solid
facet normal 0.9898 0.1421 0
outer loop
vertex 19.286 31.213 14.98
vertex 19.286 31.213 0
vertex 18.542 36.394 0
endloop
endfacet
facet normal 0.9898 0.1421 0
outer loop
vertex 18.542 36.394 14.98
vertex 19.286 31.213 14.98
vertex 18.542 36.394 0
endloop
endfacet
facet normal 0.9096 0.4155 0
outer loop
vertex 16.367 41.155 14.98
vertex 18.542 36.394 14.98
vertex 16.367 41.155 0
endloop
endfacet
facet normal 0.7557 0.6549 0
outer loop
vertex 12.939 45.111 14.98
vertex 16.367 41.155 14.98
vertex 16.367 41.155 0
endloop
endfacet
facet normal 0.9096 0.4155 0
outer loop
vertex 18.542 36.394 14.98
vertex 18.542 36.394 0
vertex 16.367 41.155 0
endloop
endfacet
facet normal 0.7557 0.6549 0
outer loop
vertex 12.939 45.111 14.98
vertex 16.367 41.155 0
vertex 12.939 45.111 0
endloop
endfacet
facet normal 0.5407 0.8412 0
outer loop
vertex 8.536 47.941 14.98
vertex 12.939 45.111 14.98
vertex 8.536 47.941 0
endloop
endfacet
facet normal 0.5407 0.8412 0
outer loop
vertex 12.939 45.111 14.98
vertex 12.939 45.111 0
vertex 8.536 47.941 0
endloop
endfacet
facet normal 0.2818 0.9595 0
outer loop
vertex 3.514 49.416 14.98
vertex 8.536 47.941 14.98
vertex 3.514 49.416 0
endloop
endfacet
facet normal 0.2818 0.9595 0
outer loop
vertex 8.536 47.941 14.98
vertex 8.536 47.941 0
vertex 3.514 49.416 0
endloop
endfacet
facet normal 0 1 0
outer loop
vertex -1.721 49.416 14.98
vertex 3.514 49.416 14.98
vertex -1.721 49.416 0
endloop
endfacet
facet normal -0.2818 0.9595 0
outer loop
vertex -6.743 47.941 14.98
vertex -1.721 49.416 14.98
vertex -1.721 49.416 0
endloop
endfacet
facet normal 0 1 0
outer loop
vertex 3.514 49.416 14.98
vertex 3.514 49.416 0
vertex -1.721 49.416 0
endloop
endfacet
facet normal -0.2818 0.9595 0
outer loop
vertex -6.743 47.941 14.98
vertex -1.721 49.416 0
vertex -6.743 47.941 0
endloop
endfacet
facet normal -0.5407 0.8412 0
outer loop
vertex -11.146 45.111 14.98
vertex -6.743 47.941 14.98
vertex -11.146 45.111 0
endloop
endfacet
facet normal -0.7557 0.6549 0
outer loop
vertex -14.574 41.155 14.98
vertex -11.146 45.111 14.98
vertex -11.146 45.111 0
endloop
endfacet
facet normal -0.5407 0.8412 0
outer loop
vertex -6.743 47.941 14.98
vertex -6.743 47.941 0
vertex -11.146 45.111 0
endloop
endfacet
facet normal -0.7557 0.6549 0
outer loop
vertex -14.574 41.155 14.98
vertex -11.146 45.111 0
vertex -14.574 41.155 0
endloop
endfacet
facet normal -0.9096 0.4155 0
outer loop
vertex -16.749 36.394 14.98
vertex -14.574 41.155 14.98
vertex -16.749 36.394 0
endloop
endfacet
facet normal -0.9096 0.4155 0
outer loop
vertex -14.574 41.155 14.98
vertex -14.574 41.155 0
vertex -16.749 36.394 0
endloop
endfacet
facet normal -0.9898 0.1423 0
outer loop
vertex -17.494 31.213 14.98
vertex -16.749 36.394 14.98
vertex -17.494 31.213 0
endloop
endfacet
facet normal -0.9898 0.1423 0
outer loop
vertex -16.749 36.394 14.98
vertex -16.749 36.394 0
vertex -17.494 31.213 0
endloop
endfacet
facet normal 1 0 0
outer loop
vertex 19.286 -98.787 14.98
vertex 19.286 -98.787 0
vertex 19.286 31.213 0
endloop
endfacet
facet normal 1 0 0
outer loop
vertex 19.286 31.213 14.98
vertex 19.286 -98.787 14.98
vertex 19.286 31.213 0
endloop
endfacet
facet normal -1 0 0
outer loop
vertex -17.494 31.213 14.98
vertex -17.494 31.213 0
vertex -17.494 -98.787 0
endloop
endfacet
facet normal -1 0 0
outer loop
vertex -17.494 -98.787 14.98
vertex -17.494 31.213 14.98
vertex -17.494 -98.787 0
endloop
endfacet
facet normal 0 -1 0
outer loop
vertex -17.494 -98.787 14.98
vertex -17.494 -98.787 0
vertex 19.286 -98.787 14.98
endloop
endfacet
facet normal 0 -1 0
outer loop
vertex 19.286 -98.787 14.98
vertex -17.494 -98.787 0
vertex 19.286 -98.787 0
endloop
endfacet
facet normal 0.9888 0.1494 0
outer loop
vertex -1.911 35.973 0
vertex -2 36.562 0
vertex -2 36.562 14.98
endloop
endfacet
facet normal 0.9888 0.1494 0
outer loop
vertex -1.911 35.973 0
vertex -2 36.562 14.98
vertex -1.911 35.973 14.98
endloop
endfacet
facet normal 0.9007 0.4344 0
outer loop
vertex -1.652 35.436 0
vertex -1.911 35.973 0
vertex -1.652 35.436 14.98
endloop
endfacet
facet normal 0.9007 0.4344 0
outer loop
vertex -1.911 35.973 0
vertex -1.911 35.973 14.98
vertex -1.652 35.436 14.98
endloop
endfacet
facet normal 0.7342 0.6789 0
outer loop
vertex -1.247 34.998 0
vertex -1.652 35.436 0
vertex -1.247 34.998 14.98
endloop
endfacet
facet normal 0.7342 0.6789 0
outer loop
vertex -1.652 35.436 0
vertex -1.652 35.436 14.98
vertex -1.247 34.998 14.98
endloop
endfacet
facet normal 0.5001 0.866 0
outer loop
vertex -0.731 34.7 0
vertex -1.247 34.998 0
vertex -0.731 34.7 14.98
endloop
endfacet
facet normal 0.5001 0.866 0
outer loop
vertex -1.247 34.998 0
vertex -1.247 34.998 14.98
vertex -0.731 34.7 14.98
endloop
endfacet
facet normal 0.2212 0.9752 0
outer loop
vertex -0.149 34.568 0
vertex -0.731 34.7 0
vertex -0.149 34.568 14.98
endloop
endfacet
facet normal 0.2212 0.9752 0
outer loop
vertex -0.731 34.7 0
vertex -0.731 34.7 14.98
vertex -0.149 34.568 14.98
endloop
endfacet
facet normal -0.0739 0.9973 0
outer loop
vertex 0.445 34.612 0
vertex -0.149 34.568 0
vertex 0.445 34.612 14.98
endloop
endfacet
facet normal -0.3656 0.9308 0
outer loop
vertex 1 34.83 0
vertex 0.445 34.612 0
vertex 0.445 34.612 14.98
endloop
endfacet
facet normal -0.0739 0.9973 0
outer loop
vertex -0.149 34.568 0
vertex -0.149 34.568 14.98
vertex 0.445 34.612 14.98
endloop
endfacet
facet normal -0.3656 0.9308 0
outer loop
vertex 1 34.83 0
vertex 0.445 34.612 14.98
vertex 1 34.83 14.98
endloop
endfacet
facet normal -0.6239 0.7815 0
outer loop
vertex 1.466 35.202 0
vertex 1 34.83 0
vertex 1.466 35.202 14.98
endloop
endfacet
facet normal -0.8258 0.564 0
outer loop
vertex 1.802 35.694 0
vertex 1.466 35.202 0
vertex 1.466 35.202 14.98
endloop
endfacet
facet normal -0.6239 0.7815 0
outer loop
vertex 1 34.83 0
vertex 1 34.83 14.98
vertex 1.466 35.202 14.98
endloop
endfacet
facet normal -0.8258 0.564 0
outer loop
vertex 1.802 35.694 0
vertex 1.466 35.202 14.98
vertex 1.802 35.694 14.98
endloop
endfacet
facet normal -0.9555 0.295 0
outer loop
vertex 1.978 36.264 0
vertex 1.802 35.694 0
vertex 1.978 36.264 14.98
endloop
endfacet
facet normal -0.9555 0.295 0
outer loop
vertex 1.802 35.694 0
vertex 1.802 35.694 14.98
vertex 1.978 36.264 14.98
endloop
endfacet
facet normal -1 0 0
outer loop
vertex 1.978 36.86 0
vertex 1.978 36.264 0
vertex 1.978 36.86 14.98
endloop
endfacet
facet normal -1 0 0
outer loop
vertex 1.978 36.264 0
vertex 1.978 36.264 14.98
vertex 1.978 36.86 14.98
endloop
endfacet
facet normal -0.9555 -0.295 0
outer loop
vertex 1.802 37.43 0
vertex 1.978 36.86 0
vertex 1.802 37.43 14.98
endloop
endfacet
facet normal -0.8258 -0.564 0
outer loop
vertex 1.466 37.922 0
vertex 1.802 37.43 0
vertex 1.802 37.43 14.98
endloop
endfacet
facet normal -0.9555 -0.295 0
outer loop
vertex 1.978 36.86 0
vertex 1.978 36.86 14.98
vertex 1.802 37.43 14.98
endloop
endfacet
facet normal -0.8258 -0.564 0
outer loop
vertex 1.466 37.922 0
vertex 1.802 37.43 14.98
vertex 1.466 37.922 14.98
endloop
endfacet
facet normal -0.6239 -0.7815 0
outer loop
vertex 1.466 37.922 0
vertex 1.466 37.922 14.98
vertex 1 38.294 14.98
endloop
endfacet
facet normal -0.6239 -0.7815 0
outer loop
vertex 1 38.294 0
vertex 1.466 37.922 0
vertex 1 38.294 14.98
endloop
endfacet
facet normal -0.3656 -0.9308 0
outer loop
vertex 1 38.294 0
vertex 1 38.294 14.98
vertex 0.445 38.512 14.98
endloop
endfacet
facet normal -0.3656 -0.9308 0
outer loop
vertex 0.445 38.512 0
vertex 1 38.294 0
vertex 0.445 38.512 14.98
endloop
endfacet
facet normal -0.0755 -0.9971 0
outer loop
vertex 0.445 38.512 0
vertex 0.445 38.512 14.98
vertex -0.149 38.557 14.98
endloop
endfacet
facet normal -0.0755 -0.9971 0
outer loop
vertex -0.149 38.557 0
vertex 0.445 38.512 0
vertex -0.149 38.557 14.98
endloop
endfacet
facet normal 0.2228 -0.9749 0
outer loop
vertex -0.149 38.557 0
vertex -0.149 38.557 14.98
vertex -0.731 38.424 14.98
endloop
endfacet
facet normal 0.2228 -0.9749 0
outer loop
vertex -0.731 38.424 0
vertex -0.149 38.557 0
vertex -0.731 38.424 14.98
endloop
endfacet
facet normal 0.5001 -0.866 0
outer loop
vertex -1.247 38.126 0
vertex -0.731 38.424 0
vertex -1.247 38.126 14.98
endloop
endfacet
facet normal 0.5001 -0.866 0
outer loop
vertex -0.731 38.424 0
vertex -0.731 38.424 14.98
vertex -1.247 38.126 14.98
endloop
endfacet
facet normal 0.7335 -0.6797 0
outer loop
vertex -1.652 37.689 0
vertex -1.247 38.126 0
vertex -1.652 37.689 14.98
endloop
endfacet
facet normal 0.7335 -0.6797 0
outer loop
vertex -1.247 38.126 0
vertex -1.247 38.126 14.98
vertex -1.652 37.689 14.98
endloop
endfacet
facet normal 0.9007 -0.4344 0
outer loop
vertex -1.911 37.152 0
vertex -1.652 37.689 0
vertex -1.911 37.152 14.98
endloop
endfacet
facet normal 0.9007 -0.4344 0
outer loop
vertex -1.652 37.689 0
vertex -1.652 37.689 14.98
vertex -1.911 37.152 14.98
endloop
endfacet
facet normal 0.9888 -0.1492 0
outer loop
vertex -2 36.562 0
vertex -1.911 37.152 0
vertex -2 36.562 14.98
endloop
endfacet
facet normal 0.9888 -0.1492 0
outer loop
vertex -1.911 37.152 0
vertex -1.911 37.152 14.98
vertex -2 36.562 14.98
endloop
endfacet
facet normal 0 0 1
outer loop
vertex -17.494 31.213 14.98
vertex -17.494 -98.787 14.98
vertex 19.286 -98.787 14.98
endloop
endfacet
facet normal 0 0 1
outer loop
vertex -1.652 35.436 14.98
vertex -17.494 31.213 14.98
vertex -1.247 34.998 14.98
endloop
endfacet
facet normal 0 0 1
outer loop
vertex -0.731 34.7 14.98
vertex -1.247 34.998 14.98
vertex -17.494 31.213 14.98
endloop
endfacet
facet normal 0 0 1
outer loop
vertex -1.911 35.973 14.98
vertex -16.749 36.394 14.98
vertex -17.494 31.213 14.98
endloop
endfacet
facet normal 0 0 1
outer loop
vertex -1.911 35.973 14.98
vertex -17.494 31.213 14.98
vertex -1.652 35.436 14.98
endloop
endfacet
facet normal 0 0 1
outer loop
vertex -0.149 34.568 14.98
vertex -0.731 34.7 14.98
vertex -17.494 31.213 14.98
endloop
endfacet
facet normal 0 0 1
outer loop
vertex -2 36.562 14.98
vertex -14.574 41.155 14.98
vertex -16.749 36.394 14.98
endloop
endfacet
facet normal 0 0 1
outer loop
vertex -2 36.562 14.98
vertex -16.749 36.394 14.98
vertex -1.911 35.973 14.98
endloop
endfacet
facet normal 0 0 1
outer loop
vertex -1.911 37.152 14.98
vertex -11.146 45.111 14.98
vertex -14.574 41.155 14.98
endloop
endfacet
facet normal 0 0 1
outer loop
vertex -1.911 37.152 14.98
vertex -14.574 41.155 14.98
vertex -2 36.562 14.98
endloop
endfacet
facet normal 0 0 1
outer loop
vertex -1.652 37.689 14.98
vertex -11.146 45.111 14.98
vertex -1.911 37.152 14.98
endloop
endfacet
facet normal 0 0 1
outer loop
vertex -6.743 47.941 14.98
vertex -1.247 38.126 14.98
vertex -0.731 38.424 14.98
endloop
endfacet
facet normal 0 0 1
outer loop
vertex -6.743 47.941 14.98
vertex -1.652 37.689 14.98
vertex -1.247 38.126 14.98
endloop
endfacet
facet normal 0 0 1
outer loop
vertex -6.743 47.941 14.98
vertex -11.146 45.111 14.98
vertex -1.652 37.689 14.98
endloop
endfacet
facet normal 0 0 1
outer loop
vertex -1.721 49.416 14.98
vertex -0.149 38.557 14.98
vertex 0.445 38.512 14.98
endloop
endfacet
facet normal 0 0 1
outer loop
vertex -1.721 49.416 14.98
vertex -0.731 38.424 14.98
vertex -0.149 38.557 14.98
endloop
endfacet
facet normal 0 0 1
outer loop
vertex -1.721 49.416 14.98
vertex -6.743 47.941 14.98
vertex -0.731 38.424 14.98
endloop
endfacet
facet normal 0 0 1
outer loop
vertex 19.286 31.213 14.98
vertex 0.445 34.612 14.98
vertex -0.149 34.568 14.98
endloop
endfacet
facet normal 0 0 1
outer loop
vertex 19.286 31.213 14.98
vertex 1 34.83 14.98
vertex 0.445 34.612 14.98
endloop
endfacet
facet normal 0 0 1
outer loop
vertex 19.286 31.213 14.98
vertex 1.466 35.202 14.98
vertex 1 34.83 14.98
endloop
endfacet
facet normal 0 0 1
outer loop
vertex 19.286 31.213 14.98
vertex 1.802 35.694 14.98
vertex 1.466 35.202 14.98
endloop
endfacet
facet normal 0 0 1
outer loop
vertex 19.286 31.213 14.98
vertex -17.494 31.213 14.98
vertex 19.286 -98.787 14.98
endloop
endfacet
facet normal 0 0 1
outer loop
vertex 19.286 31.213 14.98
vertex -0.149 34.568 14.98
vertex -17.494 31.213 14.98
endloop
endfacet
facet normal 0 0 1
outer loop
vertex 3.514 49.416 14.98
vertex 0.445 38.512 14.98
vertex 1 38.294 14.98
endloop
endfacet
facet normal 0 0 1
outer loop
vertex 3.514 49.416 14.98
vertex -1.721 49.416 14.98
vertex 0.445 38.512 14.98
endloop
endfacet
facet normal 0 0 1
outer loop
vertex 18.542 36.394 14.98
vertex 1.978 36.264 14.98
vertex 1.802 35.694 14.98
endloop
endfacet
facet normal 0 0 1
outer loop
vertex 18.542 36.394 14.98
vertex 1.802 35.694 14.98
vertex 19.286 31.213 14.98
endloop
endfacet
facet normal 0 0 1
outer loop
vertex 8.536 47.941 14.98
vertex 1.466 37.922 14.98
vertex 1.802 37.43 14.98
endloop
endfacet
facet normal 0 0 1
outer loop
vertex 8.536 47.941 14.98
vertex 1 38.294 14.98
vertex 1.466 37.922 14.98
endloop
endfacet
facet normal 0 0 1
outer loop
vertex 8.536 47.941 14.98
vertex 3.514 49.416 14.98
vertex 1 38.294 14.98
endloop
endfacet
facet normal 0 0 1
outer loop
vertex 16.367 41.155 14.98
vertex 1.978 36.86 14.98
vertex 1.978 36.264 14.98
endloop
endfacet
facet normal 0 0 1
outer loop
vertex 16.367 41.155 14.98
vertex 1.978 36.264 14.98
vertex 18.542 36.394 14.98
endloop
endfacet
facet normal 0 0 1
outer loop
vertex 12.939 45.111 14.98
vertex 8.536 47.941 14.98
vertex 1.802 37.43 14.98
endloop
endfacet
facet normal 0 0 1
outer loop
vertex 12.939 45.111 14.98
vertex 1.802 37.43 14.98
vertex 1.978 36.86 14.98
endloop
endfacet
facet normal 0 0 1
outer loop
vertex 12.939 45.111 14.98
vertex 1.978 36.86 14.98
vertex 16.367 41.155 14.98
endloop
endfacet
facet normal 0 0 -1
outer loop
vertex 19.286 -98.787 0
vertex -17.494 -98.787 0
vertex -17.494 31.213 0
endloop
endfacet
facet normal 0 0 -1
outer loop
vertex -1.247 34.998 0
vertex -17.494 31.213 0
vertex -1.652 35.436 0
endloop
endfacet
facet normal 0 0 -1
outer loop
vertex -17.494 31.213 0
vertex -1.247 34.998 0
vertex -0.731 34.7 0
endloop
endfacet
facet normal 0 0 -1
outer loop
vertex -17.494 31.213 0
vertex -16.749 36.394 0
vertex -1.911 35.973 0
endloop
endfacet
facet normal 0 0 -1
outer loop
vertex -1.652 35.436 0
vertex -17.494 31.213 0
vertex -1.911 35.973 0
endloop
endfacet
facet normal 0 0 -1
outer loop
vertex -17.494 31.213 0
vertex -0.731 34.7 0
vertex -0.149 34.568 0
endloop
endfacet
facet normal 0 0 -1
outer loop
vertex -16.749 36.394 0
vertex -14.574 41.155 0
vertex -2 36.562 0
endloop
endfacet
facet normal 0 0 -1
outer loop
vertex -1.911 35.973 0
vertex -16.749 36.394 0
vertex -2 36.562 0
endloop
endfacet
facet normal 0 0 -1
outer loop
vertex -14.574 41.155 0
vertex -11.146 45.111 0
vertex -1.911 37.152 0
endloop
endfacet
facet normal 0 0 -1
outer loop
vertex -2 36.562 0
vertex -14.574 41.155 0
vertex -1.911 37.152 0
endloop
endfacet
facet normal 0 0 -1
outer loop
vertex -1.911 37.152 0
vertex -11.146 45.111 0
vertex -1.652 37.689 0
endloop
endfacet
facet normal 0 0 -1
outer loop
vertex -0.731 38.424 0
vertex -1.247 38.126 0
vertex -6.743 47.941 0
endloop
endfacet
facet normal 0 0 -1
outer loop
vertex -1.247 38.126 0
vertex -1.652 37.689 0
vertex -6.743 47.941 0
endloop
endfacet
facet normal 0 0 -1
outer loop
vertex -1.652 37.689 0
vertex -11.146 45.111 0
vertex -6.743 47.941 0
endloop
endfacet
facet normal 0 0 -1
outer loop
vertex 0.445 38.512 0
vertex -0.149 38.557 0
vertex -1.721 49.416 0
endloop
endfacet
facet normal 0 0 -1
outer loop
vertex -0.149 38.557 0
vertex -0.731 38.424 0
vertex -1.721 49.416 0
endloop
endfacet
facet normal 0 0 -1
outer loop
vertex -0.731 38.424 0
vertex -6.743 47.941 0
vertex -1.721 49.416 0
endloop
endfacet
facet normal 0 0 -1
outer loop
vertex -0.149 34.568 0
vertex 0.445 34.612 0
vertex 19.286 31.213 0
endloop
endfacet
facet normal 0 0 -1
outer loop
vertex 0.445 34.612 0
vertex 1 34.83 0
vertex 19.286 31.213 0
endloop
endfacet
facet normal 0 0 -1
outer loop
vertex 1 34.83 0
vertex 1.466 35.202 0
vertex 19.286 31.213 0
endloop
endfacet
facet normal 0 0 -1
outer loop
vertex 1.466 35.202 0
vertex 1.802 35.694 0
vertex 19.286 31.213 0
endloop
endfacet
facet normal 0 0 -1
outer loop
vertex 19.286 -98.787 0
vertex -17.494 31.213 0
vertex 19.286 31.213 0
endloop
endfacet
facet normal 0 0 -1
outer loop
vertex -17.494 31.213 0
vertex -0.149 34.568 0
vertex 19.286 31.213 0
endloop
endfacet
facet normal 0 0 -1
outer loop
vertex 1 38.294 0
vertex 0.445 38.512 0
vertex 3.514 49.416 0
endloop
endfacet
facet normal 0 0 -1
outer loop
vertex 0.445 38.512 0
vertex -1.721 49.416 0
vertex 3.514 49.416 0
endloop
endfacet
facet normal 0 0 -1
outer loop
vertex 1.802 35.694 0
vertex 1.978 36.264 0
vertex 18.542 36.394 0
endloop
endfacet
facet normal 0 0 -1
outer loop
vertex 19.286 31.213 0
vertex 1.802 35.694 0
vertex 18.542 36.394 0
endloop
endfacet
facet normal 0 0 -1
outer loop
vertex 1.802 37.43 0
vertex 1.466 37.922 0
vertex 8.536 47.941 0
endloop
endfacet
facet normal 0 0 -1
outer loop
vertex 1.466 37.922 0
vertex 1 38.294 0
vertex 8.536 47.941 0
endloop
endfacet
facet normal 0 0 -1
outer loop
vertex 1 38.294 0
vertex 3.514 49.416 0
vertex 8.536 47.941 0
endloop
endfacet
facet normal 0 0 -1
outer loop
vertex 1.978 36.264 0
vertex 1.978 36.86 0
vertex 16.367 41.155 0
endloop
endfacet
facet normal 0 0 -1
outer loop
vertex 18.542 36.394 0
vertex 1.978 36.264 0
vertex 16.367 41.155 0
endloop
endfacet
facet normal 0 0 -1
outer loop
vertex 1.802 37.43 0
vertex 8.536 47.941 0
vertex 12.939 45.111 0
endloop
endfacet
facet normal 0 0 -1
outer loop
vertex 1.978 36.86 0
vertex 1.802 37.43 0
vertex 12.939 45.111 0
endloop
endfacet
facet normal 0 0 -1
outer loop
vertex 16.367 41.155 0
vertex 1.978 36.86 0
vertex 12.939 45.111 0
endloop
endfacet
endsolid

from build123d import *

# Parameters (mm, degrees)
RESSALTO_EXTRUS_O1_DEPTH = 14.98
ESBO_O2_R                = 2
CORTE_EXTRUS_O1_DEPTH    = 62.5


with BuildPart() as part:
    # Esboço1 → Ressalto-extrusão1 (new body)
    with BuildSketch(Plane.XY):
        with BuildLine():
            Line((-17.493550541, 31.212986182), (-17.493550541, -98.787013818))
            Line((-17.493550541, -98.787013818), (19.286449459, -98.787013818))
            Line((19.286449459, -98.787013818), (19.286449459, 31.212986182))
            ThreePointArc((19.286449459, 31.212986182), (0.896449459, 49.602986182), (-17.493550541, 31.212986182))
        make_face()
    extrude(amount=RESSALTO_EXTRUS_O1_DEPTH)

    # Esboço2 → Corte-extrusão1 (cut, symmetric)
    with BuildSketch(Plane.XY.offset(14.98)):
        with Locations(Location((0, 36.56215444, 0), (0, 0, 180))):
            Circle(ESBO_O2_R)
    extrude(amount=CORTE_EXTRUS_O1_DEPTH, both=True, mode=Mode.SUBTRACT)


solid = part.part
